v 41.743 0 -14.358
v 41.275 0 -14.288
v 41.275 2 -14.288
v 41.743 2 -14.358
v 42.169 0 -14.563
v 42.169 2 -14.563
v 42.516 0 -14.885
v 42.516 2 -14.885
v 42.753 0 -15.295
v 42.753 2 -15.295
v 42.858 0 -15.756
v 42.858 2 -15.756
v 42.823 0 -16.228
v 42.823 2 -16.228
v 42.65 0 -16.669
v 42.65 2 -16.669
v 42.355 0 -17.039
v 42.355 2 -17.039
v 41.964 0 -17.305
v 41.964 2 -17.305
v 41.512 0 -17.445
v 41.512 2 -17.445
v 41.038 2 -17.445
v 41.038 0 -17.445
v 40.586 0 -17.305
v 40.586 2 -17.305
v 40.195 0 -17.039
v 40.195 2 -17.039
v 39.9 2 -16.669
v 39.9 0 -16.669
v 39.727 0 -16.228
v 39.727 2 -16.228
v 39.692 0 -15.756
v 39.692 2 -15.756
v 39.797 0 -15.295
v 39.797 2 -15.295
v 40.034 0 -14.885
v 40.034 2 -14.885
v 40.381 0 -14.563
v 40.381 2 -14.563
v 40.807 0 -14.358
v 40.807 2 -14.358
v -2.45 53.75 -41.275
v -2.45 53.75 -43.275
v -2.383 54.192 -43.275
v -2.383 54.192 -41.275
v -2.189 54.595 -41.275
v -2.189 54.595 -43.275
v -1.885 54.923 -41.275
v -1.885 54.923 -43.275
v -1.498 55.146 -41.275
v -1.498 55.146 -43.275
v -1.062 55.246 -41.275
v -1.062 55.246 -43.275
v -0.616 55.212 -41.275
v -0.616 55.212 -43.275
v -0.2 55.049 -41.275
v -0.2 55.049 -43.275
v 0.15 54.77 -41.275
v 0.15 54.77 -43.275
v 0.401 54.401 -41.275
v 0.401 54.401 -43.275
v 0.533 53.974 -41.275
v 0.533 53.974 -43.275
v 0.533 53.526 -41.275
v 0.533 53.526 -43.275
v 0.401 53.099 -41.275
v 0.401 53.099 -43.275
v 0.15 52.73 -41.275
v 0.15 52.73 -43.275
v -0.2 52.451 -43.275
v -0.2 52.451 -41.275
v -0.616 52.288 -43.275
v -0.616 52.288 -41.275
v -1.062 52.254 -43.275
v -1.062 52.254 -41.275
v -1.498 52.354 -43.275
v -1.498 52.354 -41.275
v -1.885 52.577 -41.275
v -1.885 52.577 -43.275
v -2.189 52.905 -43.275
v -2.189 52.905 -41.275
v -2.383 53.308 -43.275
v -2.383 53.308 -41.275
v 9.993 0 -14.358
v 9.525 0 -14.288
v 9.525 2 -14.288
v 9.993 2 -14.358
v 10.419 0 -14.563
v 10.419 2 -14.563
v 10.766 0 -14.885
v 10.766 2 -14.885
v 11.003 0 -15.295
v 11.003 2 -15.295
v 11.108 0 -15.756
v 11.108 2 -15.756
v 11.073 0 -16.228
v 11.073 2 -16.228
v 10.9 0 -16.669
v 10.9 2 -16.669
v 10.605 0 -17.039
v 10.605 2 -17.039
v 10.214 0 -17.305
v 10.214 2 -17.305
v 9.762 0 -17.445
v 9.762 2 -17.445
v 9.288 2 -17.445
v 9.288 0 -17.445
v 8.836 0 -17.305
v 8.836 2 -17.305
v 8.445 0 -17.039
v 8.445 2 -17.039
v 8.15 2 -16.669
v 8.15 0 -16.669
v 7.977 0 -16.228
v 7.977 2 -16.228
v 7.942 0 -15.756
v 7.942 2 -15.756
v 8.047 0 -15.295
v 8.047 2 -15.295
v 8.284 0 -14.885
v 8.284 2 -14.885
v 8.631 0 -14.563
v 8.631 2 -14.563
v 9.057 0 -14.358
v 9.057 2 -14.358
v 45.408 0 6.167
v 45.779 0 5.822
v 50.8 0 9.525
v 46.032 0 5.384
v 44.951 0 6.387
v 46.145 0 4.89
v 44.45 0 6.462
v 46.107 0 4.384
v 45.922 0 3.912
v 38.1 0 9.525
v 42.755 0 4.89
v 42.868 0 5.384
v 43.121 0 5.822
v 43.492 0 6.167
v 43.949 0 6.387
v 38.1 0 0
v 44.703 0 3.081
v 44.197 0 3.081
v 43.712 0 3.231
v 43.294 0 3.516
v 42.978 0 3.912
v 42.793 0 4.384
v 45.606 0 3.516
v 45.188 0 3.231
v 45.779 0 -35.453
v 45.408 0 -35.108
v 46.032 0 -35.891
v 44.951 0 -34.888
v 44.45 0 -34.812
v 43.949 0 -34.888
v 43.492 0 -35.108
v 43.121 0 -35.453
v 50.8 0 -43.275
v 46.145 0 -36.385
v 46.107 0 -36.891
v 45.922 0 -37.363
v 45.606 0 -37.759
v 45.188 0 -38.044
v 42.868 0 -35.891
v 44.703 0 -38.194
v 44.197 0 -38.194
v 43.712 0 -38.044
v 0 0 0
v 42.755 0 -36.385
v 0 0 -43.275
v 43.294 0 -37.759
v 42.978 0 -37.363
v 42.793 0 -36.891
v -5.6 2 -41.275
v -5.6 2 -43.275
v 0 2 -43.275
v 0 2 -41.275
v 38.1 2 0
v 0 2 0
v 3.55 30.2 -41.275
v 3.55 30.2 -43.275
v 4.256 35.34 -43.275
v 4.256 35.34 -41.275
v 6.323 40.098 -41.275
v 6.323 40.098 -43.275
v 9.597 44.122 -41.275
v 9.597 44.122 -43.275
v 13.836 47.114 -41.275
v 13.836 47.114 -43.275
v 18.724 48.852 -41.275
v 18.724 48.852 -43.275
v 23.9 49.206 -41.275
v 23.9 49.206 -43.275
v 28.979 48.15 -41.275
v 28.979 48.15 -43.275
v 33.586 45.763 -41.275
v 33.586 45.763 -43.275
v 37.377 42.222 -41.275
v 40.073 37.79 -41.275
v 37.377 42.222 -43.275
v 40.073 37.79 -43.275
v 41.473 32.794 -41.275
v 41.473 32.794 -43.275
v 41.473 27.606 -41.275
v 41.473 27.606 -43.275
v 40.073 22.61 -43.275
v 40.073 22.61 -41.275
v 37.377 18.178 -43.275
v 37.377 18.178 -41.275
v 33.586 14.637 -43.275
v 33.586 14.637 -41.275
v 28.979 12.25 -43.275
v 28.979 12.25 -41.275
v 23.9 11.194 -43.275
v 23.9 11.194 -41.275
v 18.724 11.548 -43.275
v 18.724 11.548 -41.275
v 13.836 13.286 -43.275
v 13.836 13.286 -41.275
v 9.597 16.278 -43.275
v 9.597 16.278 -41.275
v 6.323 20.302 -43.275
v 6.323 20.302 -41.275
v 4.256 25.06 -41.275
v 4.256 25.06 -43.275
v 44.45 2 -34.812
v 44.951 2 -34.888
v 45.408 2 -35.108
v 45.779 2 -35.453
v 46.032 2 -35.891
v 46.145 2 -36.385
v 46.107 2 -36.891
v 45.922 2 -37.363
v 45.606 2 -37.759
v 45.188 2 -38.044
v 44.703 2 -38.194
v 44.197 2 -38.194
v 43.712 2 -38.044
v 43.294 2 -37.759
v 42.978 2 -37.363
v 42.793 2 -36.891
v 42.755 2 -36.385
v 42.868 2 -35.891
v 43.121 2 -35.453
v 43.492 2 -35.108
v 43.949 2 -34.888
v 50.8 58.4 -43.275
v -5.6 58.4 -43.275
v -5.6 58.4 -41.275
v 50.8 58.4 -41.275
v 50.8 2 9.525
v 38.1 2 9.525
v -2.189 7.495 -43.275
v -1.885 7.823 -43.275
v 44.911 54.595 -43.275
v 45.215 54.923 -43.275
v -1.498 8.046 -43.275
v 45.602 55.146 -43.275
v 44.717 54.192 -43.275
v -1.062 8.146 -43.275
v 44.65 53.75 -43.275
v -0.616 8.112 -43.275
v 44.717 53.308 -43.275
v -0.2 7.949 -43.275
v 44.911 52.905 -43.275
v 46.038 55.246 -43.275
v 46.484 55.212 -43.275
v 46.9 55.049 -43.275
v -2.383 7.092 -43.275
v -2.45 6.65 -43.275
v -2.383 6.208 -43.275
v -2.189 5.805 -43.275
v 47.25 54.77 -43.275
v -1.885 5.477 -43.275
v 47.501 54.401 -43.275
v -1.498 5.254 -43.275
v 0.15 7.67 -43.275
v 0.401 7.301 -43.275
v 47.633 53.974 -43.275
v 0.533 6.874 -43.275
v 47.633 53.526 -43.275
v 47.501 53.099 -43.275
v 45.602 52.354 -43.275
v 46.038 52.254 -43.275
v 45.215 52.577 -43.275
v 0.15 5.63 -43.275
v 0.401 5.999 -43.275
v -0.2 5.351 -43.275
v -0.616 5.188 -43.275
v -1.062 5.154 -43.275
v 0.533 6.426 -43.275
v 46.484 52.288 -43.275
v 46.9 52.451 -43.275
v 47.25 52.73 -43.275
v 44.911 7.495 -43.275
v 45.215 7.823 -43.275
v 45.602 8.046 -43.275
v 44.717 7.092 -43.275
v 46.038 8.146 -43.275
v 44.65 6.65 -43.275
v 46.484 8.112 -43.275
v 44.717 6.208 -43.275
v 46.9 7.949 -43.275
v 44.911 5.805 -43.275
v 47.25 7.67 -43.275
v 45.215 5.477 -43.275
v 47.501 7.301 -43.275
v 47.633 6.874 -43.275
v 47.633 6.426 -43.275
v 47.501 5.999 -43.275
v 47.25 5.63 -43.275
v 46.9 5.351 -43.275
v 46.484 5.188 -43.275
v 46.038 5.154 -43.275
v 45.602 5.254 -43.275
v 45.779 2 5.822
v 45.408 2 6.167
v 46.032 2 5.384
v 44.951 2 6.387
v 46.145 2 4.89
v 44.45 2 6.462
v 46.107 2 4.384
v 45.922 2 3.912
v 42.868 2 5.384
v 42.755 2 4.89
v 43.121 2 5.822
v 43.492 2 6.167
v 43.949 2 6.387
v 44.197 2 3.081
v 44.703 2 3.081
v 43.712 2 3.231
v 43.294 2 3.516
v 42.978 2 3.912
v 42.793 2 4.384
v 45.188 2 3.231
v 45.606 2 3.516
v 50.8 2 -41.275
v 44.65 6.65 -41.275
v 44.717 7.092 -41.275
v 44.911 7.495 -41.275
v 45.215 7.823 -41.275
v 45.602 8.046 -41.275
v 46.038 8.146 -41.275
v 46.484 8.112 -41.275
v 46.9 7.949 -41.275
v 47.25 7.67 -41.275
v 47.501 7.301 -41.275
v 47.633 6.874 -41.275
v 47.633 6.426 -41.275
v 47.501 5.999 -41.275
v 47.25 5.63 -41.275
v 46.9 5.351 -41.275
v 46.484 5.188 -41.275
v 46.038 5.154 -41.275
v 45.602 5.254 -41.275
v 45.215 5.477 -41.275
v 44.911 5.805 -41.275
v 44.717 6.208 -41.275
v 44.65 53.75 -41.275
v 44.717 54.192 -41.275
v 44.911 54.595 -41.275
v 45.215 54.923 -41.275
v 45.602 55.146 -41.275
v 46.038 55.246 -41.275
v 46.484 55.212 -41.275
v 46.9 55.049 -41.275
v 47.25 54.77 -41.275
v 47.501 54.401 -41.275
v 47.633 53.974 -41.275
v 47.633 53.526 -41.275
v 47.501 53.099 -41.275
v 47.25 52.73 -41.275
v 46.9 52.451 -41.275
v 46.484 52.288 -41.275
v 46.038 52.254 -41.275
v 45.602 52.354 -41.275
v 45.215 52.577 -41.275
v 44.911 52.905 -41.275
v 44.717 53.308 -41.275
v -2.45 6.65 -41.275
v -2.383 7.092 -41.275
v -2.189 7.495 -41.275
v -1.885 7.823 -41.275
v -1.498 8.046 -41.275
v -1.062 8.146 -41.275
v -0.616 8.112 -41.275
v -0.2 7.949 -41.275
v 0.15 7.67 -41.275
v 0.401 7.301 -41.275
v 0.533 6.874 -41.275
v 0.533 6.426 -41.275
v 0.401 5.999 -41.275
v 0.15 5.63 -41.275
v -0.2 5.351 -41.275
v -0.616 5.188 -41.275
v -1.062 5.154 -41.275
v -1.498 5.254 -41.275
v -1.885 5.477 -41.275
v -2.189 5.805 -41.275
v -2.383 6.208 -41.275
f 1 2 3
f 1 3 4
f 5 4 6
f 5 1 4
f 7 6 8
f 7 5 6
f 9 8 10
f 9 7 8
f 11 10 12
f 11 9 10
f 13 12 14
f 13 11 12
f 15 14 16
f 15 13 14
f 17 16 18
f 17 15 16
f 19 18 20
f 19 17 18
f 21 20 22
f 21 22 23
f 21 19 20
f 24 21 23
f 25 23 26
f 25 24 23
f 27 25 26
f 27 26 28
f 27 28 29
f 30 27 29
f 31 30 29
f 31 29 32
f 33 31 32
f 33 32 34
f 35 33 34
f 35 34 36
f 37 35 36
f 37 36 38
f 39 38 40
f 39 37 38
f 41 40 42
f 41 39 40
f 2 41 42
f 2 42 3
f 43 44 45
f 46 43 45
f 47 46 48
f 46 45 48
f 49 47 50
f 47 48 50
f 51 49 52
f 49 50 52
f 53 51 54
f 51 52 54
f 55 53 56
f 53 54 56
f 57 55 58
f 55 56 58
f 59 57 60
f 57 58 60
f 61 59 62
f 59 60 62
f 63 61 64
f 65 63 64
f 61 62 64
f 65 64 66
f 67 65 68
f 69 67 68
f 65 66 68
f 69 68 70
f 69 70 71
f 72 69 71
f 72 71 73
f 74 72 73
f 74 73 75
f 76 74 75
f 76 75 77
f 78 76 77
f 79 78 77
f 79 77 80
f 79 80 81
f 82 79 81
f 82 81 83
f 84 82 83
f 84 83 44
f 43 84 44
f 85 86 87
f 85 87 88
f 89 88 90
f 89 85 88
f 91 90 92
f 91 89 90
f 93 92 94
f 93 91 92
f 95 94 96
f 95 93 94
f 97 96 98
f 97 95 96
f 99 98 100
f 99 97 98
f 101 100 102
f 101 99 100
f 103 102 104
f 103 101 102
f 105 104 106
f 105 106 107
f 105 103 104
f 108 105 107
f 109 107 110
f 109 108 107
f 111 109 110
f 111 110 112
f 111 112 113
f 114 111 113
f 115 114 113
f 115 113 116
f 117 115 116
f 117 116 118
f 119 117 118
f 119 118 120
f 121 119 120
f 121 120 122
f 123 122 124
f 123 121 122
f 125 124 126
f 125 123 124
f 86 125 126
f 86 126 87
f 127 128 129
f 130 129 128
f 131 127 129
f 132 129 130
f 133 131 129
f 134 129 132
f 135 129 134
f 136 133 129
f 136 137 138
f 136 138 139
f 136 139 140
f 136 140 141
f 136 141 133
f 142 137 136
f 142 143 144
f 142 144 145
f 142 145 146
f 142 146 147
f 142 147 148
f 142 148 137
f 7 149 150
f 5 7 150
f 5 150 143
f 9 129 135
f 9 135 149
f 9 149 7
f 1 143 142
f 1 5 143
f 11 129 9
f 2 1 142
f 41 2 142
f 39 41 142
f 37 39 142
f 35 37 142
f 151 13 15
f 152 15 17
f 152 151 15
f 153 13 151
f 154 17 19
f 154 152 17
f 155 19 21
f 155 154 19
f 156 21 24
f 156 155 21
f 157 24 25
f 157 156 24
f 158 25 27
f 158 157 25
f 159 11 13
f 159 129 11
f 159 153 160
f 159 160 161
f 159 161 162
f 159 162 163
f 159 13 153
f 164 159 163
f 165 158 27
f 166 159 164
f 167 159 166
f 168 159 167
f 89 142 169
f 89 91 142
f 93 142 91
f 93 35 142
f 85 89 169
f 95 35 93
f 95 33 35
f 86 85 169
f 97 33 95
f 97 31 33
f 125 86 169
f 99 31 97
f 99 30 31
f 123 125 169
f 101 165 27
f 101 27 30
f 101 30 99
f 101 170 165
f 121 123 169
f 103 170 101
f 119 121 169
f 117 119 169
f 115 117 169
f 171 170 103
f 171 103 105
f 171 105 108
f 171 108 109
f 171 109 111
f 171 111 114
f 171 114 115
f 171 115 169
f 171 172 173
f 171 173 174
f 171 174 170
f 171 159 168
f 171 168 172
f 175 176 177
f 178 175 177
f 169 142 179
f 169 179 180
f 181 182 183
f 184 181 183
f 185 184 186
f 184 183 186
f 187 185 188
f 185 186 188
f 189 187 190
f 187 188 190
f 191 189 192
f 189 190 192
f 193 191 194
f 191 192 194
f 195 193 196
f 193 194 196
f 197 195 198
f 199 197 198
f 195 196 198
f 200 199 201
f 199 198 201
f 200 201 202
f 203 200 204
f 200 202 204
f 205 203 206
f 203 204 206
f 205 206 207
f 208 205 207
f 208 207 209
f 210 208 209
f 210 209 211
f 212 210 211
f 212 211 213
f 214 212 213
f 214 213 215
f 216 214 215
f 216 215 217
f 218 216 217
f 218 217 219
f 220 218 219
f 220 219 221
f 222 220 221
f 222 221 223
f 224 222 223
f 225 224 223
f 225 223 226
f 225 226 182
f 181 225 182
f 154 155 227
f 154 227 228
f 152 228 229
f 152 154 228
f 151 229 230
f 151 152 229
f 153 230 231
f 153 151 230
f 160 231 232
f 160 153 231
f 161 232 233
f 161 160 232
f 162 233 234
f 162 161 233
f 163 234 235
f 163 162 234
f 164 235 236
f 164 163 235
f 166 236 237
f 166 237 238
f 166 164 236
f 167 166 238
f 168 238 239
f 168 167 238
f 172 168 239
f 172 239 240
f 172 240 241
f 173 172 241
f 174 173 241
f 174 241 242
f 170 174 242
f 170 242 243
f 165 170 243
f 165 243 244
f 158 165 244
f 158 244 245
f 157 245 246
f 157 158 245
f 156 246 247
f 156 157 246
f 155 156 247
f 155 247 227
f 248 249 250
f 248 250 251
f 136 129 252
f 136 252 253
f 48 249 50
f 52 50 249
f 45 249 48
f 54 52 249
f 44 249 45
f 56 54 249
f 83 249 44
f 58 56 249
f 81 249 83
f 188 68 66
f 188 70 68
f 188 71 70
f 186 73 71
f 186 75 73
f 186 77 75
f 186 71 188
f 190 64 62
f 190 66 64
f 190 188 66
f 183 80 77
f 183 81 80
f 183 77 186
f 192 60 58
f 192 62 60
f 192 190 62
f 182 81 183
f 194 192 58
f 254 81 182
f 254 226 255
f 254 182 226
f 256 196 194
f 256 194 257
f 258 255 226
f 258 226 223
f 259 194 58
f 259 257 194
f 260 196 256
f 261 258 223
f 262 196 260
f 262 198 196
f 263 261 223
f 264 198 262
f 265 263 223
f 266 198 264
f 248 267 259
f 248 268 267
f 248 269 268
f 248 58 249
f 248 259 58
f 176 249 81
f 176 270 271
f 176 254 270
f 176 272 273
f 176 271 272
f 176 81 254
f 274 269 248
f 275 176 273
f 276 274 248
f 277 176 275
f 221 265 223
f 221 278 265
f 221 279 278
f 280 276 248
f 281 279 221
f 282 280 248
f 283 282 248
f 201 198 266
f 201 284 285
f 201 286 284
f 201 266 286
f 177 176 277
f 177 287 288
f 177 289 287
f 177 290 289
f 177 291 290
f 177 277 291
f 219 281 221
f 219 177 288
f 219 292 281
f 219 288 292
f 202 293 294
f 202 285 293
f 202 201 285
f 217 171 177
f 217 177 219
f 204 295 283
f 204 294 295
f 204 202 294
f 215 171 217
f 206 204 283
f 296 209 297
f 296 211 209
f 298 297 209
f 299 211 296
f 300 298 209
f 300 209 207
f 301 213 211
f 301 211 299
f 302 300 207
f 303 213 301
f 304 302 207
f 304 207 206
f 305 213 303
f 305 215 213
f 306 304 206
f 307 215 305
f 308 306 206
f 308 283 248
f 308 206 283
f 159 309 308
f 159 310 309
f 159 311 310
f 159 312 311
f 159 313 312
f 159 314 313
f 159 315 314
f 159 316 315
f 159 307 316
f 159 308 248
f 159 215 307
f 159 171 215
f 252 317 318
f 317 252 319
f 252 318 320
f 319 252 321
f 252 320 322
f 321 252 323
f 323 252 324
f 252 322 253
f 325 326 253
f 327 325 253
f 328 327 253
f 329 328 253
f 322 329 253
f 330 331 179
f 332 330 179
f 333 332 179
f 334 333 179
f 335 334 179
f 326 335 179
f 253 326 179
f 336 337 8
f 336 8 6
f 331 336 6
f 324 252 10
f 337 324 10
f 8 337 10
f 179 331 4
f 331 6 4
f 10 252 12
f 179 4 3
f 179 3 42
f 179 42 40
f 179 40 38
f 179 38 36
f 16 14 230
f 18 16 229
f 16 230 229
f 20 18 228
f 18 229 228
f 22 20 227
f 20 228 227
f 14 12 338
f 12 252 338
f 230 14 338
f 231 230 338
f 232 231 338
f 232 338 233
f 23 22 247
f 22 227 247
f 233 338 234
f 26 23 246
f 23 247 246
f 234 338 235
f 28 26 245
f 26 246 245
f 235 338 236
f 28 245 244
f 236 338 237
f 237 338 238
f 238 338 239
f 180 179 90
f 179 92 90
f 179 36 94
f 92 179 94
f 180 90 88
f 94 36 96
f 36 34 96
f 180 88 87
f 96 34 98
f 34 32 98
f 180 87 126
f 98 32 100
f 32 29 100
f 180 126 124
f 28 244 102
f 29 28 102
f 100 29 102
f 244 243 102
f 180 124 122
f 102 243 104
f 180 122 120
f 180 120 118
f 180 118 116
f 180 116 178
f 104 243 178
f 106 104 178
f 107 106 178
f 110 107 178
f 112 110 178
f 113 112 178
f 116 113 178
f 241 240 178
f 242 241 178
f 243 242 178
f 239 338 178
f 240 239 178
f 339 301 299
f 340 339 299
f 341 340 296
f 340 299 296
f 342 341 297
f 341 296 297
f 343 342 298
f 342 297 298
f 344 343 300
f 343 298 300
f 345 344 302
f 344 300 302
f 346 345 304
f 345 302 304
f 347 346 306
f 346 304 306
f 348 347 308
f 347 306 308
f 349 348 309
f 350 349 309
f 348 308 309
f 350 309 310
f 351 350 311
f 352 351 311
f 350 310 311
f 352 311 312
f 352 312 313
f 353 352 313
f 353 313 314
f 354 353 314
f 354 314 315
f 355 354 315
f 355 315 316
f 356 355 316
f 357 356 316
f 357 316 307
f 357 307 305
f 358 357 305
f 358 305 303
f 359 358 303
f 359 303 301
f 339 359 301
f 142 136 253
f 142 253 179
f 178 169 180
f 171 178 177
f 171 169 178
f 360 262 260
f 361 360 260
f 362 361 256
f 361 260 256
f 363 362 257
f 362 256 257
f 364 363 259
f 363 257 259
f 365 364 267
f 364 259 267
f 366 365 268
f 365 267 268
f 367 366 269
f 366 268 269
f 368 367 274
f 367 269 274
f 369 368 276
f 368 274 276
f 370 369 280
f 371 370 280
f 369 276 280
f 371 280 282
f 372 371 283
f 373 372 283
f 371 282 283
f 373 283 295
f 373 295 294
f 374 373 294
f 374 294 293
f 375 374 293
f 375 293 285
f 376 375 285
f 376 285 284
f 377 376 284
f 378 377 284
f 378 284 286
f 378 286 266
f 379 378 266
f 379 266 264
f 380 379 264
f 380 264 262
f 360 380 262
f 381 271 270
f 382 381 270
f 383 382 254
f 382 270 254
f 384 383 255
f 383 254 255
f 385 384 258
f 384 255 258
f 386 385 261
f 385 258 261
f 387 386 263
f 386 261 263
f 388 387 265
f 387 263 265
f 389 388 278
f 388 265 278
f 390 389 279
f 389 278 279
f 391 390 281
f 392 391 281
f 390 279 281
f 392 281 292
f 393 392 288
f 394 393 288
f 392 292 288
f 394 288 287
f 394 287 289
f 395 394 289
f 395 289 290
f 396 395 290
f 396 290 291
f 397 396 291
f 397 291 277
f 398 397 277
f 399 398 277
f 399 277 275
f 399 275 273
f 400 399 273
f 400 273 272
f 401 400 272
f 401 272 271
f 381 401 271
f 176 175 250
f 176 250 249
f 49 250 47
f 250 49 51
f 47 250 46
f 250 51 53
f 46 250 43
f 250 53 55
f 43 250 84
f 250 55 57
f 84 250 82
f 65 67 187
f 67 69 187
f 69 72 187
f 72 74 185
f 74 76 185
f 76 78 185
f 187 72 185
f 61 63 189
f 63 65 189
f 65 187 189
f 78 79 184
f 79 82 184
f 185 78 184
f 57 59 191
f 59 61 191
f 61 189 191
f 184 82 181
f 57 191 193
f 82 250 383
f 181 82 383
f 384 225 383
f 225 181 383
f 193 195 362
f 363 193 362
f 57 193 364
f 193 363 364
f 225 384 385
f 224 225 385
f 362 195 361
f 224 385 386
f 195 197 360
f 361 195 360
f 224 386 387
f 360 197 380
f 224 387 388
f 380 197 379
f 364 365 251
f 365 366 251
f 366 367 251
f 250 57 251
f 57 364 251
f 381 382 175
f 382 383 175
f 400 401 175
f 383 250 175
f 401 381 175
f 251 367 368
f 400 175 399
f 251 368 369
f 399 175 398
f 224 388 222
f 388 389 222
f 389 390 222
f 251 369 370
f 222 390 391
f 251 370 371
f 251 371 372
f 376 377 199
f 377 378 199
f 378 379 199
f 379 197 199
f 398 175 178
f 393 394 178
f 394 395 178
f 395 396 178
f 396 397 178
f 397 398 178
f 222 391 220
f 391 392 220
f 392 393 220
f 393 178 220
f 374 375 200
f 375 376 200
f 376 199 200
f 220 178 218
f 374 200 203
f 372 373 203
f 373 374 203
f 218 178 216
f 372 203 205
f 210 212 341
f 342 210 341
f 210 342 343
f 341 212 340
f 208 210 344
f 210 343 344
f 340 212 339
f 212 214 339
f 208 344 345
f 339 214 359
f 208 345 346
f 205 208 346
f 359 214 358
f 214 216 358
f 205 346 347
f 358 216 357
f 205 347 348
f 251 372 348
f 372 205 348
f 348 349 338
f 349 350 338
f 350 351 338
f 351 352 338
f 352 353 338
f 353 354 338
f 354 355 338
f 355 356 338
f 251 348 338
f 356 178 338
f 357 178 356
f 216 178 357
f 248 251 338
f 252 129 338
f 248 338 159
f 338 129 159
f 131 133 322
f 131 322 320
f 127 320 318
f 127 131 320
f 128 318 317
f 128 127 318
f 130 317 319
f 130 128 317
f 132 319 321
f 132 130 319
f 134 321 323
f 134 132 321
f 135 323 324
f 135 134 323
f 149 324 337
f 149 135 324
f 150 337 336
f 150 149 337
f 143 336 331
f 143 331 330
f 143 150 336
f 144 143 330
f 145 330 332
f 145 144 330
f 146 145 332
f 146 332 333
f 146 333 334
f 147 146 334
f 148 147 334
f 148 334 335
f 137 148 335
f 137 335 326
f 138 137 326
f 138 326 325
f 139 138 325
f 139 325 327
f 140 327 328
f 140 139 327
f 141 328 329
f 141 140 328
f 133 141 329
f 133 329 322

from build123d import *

# Parameters (mm, degrees)
SKETCH1_R           = 1.7
SKETCH1_R_2         = 1.5875
BOSS_EXTRUDE1_DEPTH = 2
SKETCH2_W           = 56.4
SKETCH2_H           = 2
BOSS_EXTRUDE2_DEPTH = 56.4
SKETCH3_R           = 19.05
SKETCH3_R_2         = 1.5
CUT_EXTRUDE1_DEPTH  = 94.696531419


with BuildPart() as part:
    # Sketch1 → Boss-Extrude1 (new body)
    with BuildSketch(Plane(origin=(0, 0, 0), x_dir=(1, 0, 0), z_dir=(0, 1, 0))):
        Polygon((0, 43.275), (50.8, 43.275), (50.8, -9.525), (38.1, -9.525), (38.1, 0), (0, 0), align=None)
        with Locations(Location((44.45, 36.5125, 0), (0, 0, 270))):
            Circle(SKETCH1_R, mode=Mode.SUBTRACT)
        with Locations(Location((44.45, -4.7625, 0), (0, 0, 270))):
            Circle(SKETCH1_R, mode=Mode.SUBTRACT)
        with Locations(Location((9.525, 15.875, 0), (0, 0, 270))):
            Circle(SKETCH1_R_2, mode=Mode.SUBTRACT)
        with Locations(Location((41.275, 15.875, 0), (0, 0, 270))):
            Circle(SKETCH1_R_2, mode=Mode.SUBTRACT)
    extrude(amount=BOSS_EXTRUDE1_DEPTH)

    # Sketch2 → Boss-Extrude2 (add)
    with BuildSketch(Plane(origin=(0, 2, 0), x_dir=(1, 0, 0), z_dir=(0, 1, 0))):
        with Locations((22.6, 42.275)):
            Rectangle(SKETCH2_W, SKETCH2_H)
    extrude(amount=BOSS_EXTRUDE2_DEPTH)

    # Sketch3 → Cut-Extrude1 (cut, through all)
    with BuildSketch(Plane(origin=(0, 0, -43.275), x_dir=(-1, 0, 0), z_dir=(0, 0, -1))):
        with Locations((-22.6, 30.2)):
            Circle(SKETCH3_R)
        with Locations((0.95, 53.75)):
            Circle(SKETCH3_R_2)
        with Locations((0.95, 6.65)):
            Circle(SKETCH3_R_2)
        with Locations((-46.15, 6.65)):
            Circle(SKETCH3_R_2)
        with Locations((-46.15, 53.75)):
            Circle(SKETCH3_R_2)
    extrude(amount=-CUT_EXTRUDE1_DEPTH, mode=Mode.SUBTRACT)


solid = part.part
